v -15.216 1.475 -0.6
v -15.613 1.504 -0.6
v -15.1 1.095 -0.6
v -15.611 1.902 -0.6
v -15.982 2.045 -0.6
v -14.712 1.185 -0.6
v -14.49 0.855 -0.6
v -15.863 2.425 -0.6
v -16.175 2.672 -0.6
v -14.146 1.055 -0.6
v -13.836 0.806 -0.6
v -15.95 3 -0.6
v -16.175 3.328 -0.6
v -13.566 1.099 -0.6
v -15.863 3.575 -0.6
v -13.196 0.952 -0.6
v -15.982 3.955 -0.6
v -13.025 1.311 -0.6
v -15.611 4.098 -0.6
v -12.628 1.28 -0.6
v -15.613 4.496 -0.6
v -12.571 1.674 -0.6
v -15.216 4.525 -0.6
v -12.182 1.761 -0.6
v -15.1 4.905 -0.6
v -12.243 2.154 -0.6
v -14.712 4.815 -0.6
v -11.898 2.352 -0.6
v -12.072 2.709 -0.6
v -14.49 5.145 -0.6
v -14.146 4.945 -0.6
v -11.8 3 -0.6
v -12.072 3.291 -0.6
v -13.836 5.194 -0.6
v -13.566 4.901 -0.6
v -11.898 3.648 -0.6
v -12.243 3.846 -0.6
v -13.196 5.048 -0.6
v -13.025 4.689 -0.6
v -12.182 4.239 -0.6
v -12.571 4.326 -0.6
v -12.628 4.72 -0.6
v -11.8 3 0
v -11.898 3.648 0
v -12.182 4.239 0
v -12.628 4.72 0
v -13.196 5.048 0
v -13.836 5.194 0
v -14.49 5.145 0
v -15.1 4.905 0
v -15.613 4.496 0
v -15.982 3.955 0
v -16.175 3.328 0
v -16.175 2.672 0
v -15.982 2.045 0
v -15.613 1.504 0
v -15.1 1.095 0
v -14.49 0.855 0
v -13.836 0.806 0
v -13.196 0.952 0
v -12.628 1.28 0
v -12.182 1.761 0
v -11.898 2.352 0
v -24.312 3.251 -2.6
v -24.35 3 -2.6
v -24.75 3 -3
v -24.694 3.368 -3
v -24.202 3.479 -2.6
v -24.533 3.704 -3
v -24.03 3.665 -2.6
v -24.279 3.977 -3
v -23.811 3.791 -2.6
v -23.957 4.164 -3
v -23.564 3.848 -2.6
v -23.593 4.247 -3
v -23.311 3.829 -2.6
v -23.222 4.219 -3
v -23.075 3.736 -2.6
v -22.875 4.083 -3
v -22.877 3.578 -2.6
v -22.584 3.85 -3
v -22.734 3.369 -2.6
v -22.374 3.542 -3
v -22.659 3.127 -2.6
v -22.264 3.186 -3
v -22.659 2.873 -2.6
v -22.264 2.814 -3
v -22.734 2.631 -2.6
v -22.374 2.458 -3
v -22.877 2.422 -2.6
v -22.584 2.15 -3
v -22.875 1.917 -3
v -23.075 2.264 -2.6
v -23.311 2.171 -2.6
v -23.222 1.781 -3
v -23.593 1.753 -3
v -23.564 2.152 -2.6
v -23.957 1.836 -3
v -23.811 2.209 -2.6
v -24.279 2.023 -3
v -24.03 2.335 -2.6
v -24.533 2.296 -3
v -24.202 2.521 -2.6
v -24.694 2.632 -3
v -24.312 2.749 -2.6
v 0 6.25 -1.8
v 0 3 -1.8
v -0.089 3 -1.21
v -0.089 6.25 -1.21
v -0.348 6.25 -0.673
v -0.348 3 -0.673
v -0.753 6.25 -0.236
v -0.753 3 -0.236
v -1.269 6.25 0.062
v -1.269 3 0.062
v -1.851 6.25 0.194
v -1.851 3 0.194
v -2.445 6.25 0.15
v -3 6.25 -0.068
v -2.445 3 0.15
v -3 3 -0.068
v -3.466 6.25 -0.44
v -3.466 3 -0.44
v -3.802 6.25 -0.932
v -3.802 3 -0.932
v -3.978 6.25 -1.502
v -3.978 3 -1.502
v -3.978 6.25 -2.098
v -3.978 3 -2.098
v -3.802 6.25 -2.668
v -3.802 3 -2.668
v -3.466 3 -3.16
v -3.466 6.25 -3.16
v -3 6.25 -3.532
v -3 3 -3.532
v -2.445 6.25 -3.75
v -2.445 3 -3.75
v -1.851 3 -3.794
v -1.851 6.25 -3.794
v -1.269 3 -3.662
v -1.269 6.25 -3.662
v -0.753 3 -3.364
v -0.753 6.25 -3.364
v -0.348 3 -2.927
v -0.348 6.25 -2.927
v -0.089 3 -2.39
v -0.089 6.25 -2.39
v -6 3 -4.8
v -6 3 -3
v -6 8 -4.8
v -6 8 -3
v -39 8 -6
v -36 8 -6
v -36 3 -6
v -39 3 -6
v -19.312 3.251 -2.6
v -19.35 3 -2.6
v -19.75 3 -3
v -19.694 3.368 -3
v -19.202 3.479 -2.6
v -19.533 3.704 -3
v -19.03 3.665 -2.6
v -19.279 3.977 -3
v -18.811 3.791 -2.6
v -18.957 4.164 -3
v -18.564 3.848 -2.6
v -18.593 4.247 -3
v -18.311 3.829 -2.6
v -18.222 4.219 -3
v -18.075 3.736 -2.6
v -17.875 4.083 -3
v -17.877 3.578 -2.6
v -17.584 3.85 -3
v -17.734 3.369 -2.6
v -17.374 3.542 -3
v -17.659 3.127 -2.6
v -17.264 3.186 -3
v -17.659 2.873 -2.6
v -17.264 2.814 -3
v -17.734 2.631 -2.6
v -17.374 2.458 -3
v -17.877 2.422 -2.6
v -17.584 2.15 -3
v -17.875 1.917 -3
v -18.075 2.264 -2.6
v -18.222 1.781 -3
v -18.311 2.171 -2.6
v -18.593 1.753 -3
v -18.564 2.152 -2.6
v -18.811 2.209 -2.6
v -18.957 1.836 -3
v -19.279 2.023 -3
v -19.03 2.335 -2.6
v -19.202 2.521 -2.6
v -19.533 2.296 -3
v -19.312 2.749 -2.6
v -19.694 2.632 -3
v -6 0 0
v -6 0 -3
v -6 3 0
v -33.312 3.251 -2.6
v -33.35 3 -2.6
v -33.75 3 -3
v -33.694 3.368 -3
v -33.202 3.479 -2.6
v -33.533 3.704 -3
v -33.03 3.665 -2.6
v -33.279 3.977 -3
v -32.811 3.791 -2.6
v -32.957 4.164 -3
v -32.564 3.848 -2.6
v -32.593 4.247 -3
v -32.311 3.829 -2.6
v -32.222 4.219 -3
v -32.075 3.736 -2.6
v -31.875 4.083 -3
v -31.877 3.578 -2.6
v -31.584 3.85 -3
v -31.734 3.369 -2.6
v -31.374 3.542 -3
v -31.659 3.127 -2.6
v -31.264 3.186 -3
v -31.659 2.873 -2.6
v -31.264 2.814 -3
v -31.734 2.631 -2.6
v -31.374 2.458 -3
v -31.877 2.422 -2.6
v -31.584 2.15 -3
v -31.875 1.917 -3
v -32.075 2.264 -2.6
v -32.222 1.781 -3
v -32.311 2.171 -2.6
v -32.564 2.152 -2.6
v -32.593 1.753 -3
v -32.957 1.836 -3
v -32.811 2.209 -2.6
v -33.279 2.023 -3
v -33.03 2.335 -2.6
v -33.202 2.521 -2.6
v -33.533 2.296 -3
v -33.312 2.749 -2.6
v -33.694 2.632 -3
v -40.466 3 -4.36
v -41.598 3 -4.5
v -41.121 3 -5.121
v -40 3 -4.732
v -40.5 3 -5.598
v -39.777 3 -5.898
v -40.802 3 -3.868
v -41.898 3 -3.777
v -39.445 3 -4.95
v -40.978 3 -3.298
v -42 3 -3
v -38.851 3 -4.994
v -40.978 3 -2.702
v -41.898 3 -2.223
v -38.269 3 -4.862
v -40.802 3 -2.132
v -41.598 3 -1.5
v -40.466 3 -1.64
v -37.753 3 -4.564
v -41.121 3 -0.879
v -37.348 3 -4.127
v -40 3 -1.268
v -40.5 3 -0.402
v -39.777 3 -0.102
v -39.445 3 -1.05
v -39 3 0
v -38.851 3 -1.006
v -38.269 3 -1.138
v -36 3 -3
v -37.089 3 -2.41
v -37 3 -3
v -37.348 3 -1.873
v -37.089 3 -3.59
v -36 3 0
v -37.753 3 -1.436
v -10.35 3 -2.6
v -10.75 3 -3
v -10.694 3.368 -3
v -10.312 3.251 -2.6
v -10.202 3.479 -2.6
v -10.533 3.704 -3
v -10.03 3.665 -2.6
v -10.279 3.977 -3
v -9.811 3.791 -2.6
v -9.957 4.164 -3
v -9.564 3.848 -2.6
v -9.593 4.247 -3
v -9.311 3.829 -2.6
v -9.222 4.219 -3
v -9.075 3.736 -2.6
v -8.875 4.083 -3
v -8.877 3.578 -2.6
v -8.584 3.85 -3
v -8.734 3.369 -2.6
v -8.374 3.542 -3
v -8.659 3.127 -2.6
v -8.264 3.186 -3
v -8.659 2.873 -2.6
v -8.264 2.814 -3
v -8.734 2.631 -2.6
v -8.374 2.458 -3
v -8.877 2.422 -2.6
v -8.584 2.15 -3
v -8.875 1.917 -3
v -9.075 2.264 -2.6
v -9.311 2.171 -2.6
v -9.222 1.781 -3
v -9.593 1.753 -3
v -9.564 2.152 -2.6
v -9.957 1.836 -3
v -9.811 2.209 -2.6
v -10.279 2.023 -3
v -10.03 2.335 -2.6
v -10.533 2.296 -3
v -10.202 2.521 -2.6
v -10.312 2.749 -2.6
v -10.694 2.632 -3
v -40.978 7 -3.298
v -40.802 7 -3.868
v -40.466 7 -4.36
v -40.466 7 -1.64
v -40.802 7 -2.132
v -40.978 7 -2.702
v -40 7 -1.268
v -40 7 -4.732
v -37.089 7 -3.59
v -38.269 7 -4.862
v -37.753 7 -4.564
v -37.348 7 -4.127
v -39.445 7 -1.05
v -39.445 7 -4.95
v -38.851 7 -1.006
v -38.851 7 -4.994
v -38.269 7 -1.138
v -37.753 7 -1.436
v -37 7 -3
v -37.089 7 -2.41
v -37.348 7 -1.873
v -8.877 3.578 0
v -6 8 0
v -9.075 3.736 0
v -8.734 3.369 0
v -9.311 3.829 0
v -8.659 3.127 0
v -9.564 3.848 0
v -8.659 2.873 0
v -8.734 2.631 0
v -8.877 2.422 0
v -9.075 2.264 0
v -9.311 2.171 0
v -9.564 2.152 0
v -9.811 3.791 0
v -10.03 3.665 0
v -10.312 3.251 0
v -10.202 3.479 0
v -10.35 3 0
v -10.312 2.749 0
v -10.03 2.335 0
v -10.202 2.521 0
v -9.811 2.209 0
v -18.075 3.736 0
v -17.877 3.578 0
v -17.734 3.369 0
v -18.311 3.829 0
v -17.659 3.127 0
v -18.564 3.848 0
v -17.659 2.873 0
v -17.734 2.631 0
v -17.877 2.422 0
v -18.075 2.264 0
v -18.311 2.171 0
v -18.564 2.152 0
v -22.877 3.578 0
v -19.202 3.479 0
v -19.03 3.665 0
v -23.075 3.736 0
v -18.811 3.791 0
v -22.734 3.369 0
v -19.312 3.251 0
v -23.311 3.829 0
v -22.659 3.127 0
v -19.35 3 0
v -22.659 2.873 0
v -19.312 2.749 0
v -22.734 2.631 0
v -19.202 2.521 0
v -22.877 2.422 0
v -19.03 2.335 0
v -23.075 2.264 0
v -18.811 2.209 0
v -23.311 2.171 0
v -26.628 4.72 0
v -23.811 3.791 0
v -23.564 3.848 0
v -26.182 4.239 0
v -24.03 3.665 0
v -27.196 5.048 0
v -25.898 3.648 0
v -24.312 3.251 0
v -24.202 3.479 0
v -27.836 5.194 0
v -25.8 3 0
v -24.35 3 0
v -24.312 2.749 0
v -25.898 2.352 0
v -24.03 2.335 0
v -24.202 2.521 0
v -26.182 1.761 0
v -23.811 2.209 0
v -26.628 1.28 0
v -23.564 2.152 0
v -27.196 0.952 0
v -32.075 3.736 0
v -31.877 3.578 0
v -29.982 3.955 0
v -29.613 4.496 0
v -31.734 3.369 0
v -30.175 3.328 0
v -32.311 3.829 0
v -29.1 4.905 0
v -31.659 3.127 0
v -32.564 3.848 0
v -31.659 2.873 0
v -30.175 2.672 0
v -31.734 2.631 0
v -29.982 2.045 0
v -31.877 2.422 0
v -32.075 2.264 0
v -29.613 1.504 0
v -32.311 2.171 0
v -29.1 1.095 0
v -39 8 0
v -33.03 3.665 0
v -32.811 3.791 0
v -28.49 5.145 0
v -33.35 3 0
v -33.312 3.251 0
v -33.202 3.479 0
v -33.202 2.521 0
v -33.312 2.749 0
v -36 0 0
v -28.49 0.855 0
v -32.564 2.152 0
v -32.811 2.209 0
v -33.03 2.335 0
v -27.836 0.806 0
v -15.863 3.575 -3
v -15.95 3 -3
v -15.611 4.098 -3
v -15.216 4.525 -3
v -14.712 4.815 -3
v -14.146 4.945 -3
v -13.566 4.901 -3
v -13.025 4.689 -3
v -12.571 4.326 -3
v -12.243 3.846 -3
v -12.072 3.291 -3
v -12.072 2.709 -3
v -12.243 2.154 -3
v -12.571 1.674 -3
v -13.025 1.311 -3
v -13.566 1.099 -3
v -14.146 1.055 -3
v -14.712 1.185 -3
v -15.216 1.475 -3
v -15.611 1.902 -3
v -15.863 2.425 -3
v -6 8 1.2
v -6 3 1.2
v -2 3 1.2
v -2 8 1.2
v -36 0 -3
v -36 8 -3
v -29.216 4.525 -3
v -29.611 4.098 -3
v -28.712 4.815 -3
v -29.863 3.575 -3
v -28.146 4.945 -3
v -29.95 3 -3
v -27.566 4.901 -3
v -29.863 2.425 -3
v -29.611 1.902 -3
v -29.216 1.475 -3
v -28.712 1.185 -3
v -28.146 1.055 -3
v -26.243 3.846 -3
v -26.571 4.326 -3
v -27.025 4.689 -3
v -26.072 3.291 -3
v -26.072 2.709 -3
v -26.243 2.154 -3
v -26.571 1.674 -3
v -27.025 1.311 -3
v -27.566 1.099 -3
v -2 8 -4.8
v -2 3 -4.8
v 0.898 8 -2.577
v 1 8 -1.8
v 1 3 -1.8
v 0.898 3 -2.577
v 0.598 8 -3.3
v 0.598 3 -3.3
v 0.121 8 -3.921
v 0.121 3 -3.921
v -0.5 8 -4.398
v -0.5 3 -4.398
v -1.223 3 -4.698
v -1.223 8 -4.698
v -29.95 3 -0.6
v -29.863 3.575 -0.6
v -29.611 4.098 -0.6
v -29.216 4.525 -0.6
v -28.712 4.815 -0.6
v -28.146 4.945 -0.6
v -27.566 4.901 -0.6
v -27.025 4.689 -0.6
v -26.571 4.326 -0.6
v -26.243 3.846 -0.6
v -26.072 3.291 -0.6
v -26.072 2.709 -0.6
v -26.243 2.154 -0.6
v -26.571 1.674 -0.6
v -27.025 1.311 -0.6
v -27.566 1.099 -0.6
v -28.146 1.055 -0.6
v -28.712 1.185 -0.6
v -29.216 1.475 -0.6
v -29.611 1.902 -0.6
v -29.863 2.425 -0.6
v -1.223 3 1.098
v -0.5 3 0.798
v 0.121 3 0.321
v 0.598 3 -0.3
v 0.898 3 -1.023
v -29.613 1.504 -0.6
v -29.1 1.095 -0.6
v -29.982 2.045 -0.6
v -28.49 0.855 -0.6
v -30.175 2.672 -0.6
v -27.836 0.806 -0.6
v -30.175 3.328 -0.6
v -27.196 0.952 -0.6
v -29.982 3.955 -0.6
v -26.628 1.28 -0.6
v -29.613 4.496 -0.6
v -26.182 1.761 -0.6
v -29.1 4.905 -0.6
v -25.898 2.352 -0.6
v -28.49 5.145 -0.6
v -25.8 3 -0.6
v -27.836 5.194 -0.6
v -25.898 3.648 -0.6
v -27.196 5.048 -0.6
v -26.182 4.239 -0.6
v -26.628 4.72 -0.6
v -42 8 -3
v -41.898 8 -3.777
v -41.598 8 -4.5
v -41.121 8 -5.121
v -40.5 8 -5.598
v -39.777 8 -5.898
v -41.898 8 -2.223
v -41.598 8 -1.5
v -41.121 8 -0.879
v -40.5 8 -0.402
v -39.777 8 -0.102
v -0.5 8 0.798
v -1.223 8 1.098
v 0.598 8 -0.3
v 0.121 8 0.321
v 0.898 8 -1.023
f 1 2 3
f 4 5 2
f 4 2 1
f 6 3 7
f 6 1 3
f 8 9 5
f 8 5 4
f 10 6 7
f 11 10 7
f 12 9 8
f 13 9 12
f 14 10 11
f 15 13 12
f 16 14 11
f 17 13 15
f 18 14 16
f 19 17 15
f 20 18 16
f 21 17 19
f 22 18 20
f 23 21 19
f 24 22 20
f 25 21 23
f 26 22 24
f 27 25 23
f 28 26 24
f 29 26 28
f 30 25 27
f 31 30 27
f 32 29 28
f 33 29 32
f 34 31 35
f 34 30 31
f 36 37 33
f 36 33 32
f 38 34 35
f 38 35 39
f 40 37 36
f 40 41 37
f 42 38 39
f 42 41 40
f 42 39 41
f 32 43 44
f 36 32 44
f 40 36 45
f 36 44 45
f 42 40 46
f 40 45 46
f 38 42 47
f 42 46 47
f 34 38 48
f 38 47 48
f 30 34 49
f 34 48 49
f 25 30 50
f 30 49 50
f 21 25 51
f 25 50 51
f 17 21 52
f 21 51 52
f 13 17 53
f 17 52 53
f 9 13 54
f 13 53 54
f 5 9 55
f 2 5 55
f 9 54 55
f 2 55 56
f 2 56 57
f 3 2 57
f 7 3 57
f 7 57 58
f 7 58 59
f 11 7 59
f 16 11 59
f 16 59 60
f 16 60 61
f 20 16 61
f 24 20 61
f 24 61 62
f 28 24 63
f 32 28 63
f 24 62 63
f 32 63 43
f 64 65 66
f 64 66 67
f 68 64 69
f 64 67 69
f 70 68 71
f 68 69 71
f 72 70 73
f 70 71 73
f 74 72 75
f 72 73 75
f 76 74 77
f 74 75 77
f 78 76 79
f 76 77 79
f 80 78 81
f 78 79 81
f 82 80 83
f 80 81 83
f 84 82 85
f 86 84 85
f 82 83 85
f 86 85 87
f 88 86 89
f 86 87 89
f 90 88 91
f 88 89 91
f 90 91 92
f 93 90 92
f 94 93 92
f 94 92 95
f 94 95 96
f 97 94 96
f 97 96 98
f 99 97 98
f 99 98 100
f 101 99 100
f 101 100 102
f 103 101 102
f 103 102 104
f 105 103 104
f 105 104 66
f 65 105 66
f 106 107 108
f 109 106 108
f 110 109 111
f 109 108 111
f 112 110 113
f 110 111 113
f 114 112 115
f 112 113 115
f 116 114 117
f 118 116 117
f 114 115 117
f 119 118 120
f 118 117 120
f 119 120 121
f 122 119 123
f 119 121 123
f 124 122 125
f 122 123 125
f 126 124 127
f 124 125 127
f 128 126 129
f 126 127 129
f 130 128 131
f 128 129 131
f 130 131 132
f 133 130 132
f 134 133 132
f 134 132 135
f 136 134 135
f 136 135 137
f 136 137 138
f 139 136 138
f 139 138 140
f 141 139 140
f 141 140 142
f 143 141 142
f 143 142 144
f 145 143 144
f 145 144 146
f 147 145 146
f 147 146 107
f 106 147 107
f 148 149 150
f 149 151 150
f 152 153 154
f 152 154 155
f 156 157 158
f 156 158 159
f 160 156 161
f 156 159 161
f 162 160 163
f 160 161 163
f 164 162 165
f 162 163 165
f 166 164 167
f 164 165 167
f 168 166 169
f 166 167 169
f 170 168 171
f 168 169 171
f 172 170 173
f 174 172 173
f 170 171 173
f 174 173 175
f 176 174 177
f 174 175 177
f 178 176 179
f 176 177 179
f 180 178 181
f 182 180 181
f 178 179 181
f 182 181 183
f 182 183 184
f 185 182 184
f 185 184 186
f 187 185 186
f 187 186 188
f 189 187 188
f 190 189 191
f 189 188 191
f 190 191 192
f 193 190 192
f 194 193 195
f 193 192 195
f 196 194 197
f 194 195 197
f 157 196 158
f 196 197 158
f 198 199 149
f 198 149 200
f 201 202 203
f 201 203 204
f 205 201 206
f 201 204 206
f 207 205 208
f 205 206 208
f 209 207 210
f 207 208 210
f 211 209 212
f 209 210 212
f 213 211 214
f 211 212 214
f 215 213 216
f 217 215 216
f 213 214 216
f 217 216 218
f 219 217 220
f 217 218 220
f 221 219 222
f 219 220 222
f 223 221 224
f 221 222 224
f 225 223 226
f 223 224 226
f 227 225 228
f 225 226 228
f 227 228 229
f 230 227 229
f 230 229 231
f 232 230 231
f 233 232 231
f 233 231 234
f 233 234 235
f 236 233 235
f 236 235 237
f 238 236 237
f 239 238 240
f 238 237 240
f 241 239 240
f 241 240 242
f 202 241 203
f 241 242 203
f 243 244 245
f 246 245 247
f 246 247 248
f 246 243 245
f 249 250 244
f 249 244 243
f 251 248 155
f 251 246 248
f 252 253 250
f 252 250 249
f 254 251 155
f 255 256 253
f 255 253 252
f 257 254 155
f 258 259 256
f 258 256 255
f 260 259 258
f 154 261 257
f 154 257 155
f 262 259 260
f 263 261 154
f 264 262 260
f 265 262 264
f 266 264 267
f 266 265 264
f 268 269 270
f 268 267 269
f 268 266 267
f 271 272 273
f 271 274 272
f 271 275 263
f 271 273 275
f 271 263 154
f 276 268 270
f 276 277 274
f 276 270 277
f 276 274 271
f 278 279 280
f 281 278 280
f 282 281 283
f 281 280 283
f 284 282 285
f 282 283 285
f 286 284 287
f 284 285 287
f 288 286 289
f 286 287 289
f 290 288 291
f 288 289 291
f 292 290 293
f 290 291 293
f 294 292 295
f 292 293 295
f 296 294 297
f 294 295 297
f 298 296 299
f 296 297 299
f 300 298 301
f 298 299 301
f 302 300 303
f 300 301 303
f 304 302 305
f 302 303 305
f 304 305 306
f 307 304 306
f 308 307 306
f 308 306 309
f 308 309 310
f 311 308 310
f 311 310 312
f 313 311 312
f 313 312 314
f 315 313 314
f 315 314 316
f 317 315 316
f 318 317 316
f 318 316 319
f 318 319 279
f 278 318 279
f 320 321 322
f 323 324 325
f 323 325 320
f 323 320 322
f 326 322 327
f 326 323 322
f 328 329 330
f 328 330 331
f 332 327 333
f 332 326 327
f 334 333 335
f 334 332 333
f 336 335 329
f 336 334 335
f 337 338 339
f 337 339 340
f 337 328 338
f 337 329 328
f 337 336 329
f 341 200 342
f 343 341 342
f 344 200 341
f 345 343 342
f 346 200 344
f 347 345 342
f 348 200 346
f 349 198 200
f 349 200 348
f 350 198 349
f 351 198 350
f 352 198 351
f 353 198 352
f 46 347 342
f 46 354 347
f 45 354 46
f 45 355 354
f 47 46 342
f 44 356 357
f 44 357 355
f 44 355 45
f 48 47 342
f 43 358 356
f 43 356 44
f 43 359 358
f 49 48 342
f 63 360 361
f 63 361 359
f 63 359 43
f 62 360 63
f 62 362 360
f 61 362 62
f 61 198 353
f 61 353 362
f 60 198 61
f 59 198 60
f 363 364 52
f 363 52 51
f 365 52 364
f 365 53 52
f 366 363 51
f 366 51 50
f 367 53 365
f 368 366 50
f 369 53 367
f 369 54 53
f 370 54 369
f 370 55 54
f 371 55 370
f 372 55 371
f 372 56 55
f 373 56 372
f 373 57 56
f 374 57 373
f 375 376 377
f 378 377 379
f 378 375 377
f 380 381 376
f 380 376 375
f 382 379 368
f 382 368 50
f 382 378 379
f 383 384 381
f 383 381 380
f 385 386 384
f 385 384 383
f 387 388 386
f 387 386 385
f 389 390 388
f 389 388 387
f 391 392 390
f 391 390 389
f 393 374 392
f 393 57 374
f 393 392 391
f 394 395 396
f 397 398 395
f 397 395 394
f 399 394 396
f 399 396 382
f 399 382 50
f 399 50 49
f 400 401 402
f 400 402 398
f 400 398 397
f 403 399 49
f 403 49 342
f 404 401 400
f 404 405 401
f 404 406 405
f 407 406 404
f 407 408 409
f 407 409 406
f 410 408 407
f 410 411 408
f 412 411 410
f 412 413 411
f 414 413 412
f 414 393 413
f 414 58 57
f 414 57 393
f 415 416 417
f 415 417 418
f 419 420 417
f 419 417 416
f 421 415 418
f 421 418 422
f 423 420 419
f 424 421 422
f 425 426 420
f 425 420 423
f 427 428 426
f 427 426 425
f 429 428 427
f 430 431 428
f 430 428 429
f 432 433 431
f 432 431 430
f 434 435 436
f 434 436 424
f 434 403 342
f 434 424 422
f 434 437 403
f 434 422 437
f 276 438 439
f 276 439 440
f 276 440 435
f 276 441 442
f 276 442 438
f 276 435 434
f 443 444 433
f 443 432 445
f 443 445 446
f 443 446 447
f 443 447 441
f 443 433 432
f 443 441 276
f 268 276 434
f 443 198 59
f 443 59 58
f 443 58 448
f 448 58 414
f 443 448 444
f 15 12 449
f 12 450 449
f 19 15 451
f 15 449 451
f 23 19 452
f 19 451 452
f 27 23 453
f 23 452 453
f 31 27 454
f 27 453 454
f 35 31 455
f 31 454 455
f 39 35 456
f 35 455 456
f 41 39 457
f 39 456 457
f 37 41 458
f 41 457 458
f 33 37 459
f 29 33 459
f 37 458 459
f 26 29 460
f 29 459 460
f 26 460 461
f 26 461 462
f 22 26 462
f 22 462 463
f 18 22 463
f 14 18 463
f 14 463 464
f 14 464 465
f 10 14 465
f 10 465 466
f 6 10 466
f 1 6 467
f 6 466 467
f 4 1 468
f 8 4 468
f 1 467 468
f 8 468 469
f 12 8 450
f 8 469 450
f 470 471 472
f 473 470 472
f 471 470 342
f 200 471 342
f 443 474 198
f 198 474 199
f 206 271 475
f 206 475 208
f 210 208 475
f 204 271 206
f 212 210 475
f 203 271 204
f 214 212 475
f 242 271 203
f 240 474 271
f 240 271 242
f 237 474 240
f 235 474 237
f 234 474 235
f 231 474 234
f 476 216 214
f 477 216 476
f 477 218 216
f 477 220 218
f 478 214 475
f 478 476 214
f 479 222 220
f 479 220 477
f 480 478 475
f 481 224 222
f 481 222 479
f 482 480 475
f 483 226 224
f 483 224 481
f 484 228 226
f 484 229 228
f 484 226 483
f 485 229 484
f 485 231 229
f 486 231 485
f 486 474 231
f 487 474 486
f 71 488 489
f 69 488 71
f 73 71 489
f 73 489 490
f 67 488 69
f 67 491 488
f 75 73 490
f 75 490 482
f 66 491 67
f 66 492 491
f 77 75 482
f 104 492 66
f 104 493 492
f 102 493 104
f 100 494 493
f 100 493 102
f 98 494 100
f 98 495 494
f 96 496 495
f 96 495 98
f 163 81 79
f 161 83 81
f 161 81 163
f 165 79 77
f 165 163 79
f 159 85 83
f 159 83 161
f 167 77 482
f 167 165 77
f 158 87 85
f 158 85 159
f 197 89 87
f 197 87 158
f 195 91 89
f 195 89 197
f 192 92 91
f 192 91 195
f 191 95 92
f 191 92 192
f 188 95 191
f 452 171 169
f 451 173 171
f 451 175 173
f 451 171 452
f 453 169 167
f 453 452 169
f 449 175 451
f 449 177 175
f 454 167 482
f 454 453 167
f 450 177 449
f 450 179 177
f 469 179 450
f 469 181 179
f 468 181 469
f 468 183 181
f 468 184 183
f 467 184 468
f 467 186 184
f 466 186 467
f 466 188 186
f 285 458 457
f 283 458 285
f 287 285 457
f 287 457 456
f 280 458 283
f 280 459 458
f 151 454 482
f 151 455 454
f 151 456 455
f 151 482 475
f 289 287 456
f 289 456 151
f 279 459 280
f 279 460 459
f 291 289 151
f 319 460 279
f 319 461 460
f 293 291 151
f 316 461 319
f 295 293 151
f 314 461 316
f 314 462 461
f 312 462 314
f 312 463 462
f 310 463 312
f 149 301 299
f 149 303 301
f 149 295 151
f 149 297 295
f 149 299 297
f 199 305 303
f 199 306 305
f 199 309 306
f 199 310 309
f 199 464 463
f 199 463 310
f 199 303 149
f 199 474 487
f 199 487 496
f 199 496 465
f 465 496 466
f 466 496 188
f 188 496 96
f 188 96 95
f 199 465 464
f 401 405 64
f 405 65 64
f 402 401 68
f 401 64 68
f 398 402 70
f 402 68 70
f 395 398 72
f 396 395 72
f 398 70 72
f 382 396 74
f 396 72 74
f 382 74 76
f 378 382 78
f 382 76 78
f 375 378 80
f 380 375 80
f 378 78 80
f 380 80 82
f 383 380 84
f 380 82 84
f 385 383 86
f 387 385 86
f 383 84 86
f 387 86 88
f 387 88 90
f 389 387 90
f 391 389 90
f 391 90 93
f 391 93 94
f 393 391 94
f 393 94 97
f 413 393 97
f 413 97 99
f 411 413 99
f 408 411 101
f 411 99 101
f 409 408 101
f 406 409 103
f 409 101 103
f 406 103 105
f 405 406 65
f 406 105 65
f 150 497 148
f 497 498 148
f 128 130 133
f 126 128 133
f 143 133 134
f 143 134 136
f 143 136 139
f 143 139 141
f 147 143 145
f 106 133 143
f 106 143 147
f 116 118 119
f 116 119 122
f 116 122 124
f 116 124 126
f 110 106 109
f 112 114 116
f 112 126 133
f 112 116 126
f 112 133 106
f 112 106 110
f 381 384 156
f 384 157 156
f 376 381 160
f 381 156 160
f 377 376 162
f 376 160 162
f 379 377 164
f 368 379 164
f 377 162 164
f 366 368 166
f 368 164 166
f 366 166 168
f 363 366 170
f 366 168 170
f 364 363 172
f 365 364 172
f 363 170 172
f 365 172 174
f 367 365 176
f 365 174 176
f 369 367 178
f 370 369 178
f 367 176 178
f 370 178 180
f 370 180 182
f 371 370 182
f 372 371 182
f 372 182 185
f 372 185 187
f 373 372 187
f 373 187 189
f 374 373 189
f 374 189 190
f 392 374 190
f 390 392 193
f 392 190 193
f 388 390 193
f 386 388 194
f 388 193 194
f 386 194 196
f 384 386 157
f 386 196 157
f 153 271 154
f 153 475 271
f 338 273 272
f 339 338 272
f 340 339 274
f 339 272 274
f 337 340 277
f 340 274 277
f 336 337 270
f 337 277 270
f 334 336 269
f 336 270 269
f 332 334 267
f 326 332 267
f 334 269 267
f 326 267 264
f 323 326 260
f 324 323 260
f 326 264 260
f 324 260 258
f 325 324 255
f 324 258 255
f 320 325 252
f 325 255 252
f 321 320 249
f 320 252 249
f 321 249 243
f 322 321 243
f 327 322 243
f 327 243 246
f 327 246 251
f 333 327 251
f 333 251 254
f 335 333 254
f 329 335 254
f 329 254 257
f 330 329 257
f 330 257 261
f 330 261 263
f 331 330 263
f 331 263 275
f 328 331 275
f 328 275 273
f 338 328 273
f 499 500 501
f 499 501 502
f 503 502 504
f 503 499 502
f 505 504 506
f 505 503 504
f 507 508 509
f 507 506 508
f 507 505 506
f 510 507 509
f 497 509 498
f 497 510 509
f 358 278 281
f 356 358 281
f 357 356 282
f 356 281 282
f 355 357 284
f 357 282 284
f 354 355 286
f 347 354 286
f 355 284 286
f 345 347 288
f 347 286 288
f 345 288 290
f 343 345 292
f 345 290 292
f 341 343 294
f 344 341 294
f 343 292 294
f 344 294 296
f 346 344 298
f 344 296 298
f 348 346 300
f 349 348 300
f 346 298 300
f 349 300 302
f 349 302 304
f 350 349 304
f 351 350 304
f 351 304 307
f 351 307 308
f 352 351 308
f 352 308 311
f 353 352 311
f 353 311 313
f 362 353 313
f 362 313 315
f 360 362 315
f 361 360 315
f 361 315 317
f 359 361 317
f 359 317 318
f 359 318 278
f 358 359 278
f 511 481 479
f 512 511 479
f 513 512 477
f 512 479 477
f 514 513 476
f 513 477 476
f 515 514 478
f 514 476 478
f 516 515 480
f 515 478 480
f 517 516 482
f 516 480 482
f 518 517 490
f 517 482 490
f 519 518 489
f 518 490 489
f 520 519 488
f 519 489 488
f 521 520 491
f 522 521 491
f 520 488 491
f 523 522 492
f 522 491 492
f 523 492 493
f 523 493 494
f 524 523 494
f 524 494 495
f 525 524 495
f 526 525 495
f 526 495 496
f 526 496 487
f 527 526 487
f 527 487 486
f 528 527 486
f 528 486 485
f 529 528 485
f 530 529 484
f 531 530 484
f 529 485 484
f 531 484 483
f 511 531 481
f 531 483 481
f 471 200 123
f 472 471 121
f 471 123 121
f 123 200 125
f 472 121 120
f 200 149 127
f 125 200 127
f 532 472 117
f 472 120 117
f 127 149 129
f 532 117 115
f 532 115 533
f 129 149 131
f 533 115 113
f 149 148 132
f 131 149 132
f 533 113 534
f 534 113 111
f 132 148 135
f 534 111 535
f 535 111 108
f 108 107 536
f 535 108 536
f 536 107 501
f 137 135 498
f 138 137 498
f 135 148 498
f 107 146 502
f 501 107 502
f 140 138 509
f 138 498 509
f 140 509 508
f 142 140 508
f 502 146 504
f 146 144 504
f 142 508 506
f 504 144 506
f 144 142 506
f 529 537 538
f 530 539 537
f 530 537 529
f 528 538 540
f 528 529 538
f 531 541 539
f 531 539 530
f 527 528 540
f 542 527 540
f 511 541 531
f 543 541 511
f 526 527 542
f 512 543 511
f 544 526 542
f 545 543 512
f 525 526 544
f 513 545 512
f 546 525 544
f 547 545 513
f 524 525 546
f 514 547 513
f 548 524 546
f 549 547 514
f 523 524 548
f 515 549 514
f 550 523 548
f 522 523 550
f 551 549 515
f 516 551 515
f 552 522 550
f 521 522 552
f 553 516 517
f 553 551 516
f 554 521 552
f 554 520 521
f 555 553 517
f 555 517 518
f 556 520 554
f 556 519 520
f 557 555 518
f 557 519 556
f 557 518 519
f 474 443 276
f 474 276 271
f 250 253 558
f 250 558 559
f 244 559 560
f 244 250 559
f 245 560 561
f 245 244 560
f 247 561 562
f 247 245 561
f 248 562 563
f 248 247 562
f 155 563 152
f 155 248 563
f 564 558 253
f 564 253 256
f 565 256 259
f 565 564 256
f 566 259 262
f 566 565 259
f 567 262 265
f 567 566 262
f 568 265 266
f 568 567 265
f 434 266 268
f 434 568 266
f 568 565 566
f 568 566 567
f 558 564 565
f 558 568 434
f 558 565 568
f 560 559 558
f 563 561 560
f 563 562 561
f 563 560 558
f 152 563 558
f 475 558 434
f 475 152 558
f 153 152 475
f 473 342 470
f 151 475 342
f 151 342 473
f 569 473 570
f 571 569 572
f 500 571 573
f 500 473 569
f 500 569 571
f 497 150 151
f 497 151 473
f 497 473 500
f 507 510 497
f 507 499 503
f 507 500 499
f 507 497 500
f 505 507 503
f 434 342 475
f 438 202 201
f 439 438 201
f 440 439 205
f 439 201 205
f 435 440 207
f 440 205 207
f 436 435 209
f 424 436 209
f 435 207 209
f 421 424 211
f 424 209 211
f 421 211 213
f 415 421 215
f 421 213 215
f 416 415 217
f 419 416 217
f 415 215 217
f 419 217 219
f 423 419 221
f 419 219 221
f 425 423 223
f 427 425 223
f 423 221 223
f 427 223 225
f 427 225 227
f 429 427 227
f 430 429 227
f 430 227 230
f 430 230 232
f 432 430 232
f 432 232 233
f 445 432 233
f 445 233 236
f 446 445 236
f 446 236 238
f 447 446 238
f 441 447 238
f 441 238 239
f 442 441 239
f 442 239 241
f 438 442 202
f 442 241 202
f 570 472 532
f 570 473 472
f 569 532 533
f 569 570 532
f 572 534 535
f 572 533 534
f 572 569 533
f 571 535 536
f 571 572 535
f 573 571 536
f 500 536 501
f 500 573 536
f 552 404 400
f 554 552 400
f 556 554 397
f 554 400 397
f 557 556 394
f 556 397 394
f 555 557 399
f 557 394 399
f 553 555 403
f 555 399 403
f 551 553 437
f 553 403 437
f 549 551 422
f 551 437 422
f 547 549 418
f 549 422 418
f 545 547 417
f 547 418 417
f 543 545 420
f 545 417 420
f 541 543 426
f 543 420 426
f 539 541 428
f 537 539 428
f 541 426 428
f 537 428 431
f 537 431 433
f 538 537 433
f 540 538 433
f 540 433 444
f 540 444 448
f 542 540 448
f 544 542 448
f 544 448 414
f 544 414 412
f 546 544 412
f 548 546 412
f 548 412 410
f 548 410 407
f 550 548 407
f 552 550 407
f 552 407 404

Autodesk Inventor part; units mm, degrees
ref_plane "YZ Plane" through (0, 0, 0) normal (1, 0, 0) x (0, 1, 0)
ref_plane "XZ Plane" through (0, 0, 0) normal (0, 1, 0) x (-1, 0, 0)
ref_plane "XY Plane" through (0, 0, 0) normal (0, 0, 1) x (1, 0, 0)
sketch "Szkic1" plane through (0, 0, 0) normal (0, 1, 0) x (-1, 0, 0)
  line L0 (0, 0) -> (42, 0)
  line L1 (42, 0) -> (42, -3)
  line L2 (42, -3) -> (0, -3)
  line L3 (0, -3) -> (0, 0)
  dimension "d0" = 42
  dimension "d1" = 3
extrude "Wyciągnięcie proste1" add sketch "Szkic1" along normal blind 8
sketch "Szkic2" plane through (0, 8, 0) normal (0, 1, 0) x (1, 0, 0)
  circle A0 centre (-39.3616, 1.5) radius 1
  point P0 (0, 0)
  dimension "d4" = 2
extrude "Wyciągnięcie proste2" cut sketch "Szkic2" against normal blind 0.2
sketch "Szkic3" plane through (0, 0, -3) normal (0, 0, -1) x (-1, 0, 0)
  line L0 (0, 0) -> (42, 0) projected
  line L1 (0, 8) -> (42, 8) projected
  line L2 (42, 0) -> (36, 0)
  line L3 (36, 0) -> (36, 8)
  line L4 (36, 8) -> (42, 8)
  line L5 (42, 8) -> (42, 0)
  line L6 (0, 8) -> (6, 8)
  line L7 (6, 8) -> (6, 0)
  line L8 (6, 0) -> (0, 0)
  line L9 (0, 0) -> (0, 8)
  circle A0 centre (9.5, 3) radius 0.85
  circle A1 centre (18.5, 3) radius 0.85
  circle A2 centre (23.5, 3) radius 0.85
  circle A3 centre (32.5, 3) radius 0.85
  circle A4 centre (14, 3) radius 1.95
  circle A5 centre (28, 3) radius 1.95
  dimension "d7" = 6
  dimension "d8" = 6
  dimension "d9" = 1.7
  dimension "d10" = 1.7
  dimension "d11" = 1.7
  dimension "d12" = 1.7
  dimension "d13" = 3.5
  dimension "d14" = 3.5
  dimension "d15" = 3
  dimension "d16" = 3
  dimension "d17" = 3
  dimension "d18" = 3
  dimension "d19" = 9
  dimension "d20" = 9
  dimension "d21" = 3.9
  dimension "d22" = 3
  dimension "d23" = 4.5
  dimension "d24" = 3.9
  dimension "d25" = 3
  dimension "d26" = 4.5
extrude "Wyciągnięcie proste3" cut sketch "Szkic3" against normal blind 3 contours A0 | A1 | A2 | A3 | A4 | A5
sketch "Szkic4" plane through (0, 8, 0) normal (0, 1, 0) x (1, 0, 0)
  line L0 (-42, 0) -> (0, 0) projected
  line L1 (-42, 0) -> (-36, 0)
  line L2 (-36, 0) -> (-36, 6)
  line L3 (-36, 6) -> (-42, 6)
  line L4 (-42, 6) -> (-42, 0)
  dimension "d29" = 6
  dimension "d30" = 6
extrude "Wyciągnięcie proste4" add sketch "Szkic4" against normal blind 8
sketch "Szkic5" plane through (0, 0, 0) normal (0, -1, 0) x (1, 0, 0)
  line L0 (-42, 0) -> (0, 0) projected
  line L1 (-36, -3) -> (-36, -6) projected
  line L2 (-42, 0) -> (-36, 0)
  line L3 (-36, 0) -> (-36, -6)
  line L4 (-36, -6) -> (-42, -6)
  line L5 (-42, -6) -> (-42, 0)
extrude "Wyciągnięcie proste5" cut sketch "Szkic5" against normal blind 3
sketch "Szkic20" plane through (0, 8, 0) normal (0, 1, 0) x (1, 0, 0)
  line L0 (0, 3) -> (-36, 3) projected
  line L1 (0, 0) -> (-6, 0)
  line L2 (-6, 0) -> (-6, 3)
  line L3 (-6, 3) -> (0, 3)
  line L4 (0, 3) -> (0, 0)
  line L5 (0, 0) -> (-6, 0)
  line L6 (-6, 0) -> (-6, 5.8)
  line L7 (-6, 5.8) -> (0, 5.8)
  line L8 (0, 5.8) -> (0, 0)
  line L9 (-6, 0) -> (2, 0)
  line L10 (2, 0) -> (2, -2.2)
  line L11 (2, -2.2) -> (-6, -2.2)
  line L12 (-6, -2.2) -> (-6, 0)
  line L13 (2, 0) -> (0, 0)
  line L14 (0, 0) -> (0, 5.8)
  line L15 (0, 5.8) -> (2, 5.8)
  line L16 (2, 5.8) -> (2, 0)
  dimension "d105" = 6
  dimension "d106" = 5.8
  dimension "d107" = 8
  dimension "d108" = 2.2
extrude "Wyciągnięcie proste23" add sketch "Szkic20" against normal blind 5
sketch "Szkic21" plane through (0, 0, 0) normal (0, -1, 0) x (1, 0, 0)
  line L0 (0, 0) -> (0, -3) projected
  line L1 (-6, 2.2) -> (-6, 0) projected
  line L2 (0, -3) -> (-6, -3)
  line L3 (-6, -3) -> (-6, 0)
  line L4 (-6, 0) -> (0, 0)
  line L5 (0, 0) -> (0, -3)
extrude "Wyciągnięcie proste24" cut sketch "Szkic21" against normal blind 3
sketch "Szkic22" plane through (0, 3, 0) normal (0, -1, 0) x (1, 0, 0)
  circle A0 centre (-2, -1.8) radius 2
  line L0 (-6, -5.8) -> (2, -5.8) projected
  line L1 (2, -5.8) -> (2, 2.2) projected
  line L2 (-6, -3) -> (-6, -5.8) projected
  line L3 (-6, -5.8) -> (2, -5.8)
  line L4 (2, -5.8) -> (2, -4.8)
  line L5 (2, -4.8) -> (-6, -4.8)
  line L6 (-6, -4.8) -> (-6, -5.8)
  line L7 (2, -4.8) -> (1, -4.8)
  line L8 (1, -4.8) -> (1, 2.2)
  line L9 (1, 2.2) -> (2, 2.2)
  line L10 (2, 2.2) -> (2, -4.8)
  line L11 (1, 2.2) -> (-6, 2.2)
  line L12 (-6, 2.2) -> (-6, 1.2)
  line L13 (-6, 1.2) -> (1, 1.2)
  line L14 (1, 1.2) -> (1, 2.2)
  point P0 (0, 0)
  point P1 (-2, -5.8)
  point P2 (2, -1.8)
  point P3 (2, 2.2)
  point P4 (1, 1.2)
  dimension "d113" = 4
  dimension "d114" = 4
  dimension "d115" = 4
  dimension "d116" = 8
  dimension "d117" = 1
  dimension "d118" = 1
  dimension "d119" = 1
extrude "Wyciągnięcie proste25" cut sketch "Szkic22" against normal blind 3.25 contours A0
extrude "Wyciągnięcie proste26" cut sketch "Szkic22" against normal blind 5 contours L2 L5 L1 L0 | L5 L8 L9 L1 | L13 L12 L11 L8
sketch "Szkic25" plane through (-42, 3, 0) normal (0, 0, 1) x (1, 0, 0)
  circle A0 centre (28, 0) radius 1.95 projected
  circle A1 centre (28, 0) radius 2.2
  circle A2 centre (14, 0) radius 1.95 projected
  circle A3 centre (14, 0) radius 2.2
  point P0 (42, -3)
  dimension "d132" = 4.4
  dimension "d133" = 4.4
extrude "Wyciągnięcie proste29" cut sketch "Szkic25" against normal blind 0.6 contours A0 | A1 | A2 | A3
sketch "Szkic26" plane through (0, 3, 0) normal (0, -1, 0) x (1, 0, 0)
  circle A0 centre (-39, -3) radius 2
  line L0 (-42, 0) -> (-36, 0) projected
  line L1 (-42, -6) -> (-42, 0) projected
  point P0 (0, 0)
  point P1 (-42, -3)
  dimension "d136" = 4
  dimension "d137" = 3
  dimension "d138" = 3
extrude "Wyciągnięcie proste30" cut sketch "Szkic26" against normal blind 4
fillet "Fillet1" radius 3 4 edges at (-42, 5.5, -6) (1, 5.5, -4.8) (-42, 5.5, 0) (1, 5.5, 1.2)
chamfer "Chamfer1" distance 0.4 angle 45 4 edges at (-31.65, 3, -3) (-22.65, 3, -3) (-17.65, 3, -3) (-8.65, 3, -3)
properties part number "rmwall" material "Tworzywo sztuczne PET"
